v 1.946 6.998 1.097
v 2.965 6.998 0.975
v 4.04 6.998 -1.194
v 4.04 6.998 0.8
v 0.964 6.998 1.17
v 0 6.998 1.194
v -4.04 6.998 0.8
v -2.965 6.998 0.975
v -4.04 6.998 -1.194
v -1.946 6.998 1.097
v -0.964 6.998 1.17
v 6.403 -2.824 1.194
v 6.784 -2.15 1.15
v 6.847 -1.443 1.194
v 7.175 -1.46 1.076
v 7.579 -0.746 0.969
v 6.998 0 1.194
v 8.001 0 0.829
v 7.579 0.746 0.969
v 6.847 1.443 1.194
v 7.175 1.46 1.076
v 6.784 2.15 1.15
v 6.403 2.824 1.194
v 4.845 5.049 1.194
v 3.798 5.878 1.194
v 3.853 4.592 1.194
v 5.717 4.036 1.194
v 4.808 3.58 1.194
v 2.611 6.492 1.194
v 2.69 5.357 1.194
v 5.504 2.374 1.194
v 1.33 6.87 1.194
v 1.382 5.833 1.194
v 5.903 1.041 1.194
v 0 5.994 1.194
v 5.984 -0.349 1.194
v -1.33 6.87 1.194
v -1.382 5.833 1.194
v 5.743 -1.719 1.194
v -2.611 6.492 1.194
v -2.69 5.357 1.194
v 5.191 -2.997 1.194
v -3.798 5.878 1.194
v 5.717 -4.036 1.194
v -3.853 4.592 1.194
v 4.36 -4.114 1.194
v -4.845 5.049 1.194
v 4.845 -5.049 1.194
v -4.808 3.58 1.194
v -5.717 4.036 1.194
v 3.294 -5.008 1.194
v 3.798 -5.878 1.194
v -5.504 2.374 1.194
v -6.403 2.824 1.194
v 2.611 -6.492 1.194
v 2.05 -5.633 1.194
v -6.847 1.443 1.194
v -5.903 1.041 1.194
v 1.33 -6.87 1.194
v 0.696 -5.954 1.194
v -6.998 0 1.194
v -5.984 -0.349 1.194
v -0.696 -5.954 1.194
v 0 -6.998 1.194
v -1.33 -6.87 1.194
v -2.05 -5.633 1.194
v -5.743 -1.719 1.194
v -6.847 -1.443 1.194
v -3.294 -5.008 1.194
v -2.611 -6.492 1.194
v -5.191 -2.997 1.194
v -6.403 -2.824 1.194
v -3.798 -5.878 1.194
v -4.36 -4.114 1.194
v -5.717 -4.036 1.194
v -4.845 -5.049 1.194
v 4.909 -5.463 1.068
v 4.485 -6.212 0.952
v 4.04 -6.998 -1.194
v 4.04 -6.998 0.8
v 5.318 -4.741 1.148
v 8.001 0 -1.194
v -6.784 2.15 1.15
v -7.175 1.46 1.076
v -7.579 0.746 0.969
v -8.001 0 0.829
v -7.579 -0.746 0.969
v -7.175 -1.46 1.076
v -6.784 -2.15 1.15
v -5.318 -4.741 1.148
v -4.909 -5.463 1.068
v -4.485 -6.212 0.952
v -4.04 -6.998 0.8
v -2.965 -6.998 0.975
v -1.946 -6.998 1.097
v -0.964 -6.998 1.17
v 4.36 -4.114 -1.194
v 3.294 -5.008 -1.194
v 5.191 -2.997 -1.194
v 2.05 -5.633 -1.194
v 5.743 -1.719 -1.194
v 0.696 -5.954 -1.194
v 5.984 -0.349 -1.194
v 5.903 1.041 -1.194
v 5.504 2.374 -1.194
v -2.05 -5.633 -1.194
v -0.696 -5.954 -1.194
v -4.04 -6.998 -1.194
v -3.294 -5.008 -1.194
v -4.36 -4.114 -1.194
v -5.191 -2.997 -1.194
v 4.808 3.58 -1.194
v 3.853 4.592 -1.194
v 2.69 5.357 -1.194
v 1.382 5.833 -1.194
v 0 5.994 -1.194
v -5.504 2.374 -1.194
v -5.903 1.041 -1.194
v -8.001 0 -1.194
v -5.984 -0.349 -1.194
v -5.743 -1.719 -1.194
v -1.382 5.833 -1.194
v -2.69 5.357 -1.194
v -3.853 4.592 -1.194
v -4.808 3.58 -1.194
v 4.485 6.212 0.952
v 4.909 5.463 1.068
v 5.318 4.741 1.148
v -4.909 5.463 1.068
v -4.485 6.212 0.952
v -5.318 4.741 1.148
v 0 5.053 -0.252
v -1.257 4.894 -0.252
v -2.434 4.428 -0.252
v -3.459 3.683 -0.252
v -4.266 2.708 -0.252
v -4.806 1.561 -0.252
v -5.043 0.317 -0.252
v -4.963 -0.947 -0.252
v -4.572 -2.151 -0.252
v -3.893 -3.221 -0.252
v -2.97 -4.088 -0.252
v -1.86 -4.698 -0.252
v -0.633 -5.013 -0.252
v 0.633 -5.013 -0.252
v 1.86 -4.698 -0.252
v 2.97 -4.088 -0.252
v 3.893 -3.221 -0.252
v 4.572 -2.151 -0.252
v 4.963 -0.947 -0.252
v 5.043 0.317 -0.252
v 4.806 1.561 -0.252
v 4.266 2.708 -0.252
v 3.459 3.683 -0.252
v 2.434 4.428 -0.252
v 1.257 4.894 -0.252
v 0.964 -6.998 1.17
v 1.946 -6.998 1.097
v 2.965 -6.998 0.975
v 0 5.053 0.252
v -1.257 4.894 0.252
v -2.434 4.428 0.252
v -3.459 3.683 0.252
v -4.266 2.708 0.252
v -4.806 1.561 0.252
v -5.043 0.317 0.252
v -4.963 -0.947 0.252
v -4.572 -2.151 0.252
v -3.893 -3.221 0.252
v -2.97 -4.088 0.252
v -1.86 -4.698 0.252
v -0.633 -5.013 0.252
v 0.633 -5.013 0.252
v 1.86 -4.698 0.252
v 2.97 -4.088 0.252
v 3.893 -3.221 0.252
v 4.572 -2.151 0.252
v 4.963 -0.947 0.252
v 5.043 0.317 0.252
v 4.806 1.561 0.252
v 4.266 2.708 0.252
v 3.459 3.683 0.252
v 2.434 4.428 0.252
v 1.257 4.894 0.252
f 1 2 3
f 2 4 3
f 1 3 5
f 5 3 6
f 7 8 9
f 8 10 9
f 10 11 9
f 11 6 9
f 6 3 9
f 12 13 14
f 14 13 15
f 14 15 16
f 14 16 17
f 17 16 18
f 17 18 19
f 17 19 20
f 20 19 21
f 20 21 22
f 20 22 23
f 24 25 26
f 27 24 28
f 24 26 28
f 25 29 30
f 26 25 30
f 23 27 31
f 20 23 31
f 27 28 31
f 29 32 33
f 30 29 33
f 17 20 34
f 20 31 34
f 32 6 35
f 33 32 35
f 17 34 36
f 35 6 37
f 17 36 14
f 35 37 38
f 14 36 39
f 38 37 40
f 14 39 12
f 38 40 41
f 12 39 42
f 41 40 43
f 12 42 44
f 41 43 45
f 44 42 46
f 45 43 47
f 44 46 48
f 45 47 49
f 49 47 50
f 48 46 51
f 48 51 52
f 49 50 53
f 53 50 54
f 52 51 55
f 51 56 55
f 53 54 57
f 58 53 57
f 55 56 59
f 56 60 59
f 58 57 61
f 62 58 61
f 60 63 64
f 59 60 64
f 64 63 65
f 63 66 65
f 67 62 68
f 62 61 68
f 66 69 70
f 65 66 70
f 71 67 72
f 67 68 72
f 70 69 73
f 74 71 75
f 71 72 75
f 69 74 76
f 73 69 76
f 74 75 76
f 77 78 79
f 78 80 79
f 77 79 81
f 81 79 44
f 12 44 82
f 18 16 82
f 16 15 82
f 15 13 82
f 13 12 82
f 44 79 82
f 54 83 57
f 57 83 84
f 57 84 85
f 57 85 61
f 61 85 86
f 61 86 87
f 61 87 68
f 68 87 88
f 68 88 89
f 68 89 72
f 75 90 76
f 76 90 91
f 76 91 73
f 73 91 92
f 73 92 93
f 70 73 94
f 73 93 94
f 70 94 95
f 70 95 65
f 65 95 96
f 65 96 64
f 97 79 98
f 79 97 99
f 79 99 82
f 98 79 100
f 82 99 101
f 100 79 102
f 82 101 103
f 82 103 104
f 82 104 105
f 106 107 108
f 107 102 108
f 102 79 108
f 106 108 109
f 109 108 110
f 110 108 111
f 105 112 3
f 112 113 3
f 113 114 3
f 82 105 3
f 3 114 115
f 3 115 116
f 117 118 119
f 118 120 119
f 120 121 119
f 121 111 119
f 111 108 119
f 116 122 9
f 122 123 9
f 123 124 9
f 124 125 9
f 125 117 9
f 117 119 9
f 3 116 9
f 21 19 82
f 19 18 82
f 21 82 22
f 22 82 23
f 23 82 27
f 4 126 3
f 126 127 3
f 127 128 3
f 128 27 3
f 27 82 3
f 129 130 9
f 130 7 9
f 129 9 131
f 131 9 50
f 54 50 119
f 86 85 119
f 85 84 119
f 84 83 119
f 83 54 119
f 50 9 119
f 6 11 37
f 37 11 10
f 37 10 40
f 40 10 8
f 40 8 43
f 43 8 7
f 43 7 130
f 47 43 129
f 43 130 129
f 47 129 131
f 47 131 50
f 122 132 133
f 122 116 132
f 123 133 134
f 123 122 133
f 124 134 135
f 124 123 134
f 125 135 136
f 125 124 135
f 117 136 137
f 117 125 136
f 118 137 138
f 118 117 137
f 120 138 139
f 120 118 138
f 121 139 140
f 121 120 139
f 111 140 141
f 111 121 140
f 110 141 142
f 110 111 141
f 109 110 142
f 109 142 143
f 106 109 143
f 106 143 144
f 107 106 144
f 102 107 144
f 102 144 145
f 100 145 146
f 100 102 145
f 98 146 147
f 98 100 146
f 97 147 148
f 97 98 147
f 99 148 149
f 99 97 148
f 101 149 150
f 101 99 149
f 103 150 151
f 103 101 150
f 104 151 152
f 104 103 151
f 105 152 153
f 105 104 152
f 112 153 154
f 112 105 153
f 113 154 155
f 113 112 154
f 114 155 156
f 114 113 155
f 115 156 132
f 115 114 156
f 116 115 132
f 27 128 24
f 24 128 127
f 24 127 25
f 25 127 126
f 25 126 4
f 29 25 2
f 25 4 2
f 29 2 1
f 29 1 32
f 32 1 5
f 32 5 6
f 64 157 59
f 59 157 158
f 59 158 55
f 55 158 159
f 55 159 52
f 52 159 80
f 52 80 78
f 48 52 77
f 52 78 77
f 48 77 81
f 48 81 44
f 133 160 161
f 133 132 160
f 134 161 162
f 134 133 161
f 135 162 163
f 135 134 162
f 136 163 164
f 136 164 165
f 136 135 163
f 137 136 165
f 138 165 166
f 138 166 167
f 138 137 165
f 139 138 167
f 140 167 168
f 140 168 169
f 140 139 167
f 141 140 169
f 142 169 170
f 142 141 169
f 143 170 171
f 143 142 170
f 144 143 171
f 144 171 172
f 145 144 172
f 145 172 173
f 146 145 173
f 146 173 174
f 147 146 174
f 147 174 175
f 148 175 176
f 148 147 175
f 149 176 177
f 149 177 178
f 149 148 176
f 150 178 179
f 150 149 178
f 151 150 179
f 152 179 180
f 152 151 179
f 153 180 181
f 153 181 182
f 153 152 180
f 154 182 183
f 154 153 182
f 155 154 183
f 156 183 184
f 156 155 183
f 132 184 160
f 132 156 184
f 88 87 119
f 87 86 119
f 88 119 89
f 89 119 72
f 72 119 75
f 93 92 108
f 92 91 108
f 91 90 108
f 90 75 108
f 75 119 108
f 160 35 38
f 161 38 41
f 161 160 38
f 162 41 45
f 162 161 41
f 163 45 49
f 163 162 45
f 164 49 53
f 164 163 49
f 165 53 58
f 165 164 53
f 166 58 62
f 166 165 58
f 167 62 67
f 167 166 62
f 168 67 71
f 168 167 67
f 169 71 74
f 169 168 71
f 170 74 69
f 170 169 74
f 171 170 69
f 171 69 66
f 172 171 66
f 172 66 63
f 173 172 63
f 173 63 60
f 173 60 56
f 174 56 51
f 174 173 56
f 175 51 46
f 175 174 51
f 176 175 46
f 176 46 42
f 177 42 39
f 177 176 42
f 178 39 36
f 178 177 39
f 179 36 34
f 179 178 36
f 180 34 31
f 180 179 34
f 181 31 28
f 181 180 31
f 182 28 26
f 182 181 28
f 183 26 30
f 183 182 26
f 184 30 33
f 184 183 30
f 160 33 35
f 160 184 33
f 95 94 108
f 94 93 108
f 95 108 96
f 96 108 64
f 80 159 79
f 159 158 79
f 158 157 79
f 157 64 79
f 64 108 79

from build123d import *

# Parameters (mm, degrees)
SKETCH2_W               = 27.9908
SKETCH2_H               = 27.9908
CUT_EXTRUDE1_DEPTH      = 2.3876
CUT_EXTRUDE1_DEPTH_BACK = 2.3876


with BuildPart() as part:
    # Sketch1 → Revolve1 (revolve)
    with BuildSketch(Plane(origin=(0, 0, 0), x_dir=(0, 0, -1), z_dir=(1, 0, 0))):
        Polygon((-1.1938, 0), (-1.1938, 6.9977), (-0.684409098, 8.39724), (1.1938, 8.39724), (1.1938, 0), align=None)
    revolve(axis=Axis((0, 0, -1.1938), (0, 0, 1)))

    # Sketch2 → Cut-Extrude1 (cut, two sides)
    with BuildSketch(Plane.XY) as cut_extrude1_sk:
        Rectangle(SKETCH2_W, SKETCH2_H)
        Polygon((-8.001, 0), (-4.040123979, -6.9977), (4.040123979, -6.9977), (8.001, 0), (4.040123979, 6.9977), (-4.040123979, 6.9977), align=None, mode=Mode.SUBTRACT)
    extrude(amount=CUT_EXTRUDE1_DEPTH, mode=Mode.SUBTRACT)
    extrude(cut_extrude1_sk.sketch, amount=-CUT_EXTRUDE1_DEPTH_BACK, mode=Mode.SUBTRACT)

    # Sketch3 → Cut-Revolve1 (revolve, cut)
    with BuildSketch(Plane(origin=(0, 0, 0), x_dir=(0, 0, -1), z_dir=(1, 0, 0))):
        Polygon((-1.1938, 0), (-1.1938, 5.9944), (-0.2524, 5.053), (0.2524, 5.053), (1.1938, 5.9944), (1.1938, 0), align=None)
    revolve(axis=Axis((0, 0, -1.1938), (0, 0, 1)), mode=Mode.SUBTRACT)


solid = part.part
